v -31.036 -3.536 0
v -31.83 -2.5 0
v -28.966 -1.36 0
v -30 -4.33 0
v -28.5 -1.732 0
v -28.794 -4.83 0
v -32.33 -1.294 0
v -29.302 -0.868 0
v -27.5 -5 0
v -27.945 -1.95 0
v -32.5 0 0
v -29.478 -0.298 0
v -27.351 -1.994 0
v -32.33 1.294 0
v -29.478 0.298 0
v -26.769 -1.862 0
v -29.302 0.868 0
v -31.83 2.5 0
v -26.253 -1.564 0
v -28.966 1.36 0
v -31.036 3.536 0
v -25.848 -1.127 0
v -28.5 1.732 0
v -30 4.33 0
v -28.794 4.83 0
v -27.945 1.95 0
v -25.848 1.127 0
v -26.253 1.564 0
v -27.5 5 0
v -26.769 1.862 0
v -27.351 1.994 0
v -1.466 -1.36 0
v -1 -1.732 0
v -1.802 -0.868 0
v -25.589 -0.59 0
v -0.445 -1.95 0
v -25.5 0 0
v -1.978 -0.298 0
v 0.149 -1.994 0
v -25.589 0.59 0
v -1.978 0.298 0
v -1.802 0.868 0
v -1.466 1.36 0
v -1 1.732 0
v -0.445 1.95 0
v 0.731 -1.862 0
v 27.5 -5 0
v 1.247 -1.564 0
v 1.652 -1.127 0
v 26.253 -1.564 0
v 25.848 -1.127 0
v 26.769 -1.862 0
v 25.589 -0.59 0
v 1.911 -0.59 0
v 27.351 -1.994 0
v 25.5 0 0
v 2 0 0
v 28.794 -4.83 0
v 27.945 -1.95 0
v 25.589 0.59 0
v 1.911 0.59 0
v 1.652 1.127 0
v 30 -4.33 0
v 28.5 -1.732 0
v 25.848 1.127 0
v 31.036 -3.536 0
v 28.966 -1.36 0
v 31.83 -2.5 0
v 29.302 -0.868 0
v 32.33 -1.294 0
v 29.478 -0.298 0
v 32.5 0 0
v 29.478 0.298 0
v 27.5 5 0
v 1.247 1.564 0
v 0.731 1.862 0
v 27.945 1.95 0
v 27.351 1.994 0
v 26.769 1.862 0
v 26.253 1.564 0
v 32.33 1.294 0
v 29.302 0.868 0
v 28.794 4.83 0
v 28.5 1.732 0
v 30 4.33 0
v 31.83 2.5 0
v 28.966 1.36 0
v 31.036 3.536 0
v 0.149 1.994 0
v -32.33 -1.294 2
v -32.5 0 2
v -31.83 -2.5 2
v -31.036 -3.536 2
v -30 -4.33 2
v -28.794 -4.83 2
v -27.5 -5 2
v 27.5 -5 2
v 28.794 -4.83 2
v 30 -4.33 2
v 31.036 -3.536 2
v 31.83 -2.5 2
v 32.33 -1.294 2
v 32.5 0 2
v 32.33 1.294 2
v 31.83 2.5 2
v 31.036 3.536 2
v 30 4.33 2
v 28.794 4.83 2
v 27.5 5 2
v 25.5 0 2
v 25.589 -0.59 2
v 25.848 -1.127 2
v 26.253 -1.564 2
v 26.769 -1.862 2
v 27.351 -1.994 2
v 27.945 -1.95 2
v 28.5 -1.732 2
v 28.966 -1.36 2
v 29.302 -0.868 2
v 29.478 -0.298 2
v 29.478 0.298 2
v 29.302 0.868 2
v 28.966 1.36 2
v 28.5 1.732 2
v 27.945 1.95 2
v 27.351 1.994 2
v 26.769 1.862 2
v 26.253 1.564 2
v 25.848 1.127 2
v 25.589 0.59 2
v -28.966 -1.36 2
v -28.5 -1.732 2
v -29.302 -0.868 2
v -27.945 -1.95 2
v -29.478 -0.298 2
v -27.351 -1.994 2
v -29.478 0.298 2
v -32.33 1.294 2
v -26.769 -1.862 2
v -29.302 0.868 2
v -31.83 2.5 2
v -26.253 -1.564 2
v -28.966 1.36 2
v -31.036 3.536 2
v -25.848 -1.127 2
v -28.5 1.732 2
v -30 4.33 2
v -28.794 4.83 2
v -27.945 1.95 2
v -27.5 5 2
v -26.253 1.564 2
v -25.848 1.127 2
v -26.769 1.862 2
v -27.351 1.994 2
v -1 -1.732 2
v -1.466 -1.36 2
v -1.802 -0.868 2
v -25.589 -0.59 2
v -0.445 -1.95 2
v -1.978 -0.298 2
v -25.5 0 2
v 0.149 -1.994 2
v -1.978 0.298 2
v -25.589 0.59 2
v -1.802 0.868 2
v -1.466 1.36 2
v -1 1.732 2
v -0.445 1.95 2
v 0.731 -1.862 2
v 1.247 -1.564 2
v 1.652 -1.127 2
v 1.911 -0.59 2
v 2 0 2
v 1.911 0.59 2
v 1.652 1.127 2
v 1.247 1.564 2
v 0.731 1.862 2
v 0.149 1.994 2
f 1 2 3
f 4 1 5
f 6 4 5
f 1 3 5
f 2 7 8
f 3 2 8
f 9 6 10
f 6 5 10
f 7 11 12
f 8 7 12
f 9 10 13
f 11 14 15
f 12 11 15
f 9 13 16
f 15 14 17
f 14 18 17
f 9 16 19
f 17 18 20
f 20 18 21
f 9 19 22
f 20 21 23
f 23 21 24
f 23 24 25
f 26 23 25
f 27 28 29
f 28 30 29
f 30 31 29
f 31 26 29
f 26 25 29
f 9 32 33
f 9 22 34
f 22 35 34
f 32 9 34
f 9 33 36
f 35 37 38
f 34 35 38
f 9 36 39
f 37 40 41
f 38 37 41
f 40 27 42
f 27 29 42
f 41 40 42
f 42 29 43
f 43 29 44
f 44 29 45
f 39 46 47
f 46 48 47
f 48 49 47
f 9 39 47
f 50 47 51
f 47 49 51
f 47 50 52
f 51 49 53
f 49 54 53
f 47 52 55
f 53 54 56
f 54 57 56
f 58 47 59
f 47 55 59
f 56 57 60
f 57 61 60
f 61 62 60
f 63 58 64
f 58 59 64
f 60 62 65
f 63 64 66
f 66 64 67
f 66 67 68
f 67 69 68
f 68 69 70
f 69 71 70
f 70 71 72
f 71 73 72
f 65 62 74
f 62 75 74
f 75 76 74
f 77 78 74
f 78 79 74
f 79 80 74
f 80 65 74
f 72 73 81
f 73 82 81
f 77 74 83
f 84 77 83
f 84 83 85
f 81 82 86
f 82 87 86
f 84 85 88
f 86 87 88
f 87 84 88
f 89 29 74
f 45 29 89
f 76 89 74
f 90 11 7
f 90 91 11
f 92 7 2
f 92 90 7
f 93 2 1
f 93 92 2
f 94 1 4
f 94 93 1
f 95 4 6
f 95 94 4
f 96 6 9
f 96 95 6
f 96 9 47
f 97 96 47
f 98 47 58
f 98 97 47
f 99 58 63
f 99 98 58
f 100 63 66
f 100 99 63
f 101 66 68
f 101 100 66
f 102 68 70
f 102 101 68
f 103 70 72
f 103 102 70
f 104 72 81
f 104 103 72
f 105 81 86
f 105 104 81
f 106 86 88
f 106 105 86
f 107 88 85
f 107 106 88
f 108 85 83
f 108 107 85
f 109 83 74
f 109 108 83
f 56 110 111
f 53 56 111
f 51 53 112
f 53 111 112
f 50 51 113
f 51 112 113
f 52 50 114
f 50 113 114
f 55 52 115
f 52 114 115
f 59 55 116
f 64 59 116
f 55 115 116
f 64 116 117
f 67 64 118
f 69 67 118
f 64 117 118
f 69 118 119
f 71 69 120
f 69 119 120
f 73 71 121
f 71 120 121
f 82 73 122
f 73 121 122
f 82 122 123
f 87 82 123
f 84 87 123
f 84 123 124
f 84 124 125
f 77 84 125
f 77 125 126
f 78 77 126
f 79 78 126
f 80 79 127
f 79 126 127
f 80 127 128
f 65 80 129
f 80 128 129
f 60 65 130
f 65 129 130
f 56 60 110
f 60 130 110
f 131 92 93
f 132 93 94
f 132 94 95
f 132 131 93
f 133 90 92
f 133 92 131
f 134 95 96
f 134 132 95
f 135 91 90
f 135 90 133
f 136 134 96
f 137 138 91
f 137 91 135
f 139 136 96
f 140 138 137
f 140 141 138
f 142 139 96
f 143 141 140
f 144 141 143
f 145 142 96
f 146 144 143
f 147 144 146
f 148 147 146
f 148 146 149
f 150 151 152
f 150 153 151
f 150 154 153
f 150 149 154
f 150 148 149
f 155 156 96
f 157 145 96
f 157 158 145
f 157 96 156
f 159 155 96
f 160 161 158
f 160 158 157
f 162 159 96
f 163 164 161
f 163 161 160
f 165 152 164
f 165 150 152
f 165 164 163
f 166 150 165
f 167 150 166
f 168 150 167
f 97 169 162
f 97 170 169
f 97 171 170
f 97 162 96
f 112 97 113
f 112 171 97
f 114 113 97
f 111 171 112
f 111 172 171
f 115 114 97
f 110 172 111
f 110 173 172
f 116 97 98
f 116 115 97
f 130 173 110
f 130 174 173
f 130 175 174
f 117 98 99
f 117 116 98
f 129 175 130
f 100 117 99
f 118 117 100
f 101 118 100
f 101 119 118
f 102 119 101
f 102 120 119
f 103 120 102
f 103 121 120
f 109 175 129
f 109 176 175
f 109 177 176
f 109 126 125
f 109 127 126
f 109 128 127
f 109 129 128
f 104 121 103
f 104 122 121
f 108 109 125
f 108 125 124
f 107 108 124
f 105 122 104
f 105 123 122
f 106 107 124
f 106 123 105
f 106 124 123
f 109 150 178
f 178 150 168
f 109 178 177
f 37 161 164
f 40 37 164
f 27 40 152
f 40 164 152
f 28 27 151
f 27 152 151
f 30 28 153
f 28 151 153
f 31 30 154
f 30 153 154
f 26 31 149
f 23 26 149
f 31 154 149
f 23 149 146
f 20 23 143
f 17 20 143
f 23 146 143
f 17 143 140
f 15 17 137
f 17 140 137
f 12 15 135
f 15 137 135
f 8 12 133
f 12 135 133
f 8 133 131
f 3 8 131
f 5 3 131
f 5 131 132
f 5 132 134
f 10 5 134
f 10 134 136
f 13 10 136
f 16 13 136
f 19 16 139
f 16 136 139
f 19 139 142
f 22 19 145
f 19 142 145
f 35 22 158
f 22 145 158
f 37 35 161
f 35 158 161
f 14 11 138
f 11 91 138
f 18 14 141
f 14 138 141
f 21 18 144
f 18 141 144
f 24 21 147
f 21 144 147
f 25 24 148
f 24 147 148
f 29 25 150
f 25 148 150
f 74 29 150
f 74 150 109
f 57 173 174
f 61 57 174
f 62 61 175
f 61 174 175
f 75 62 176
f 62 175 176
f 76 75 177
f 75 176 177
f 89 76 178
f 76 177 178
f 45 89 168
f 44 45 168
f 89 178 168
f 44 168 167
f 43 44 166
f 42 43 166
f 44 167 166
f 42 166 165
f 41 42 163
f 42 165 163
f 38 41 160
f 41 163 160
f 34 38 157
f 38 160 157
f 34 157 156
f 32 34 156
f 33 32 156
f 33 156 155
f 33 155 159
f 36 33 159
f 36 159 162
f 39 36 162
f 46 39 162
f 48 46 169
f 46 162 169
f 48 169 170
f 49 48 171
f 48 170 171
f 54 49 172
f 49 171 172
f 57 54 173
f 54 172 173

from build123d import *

# Parameters (mm, degrees)
SKETCH_1_W          = 65
SKETCH_1_H          = 10
EXTRUDE_1_DEPTH     = 2
FILLET_1_R          = 5
SKETCH_3_R          = 2
CUT_EXTRUDE_1_DEPTH = 2


with BuildPart() as part:
    # 草图1 → 凸台-拉伸1 (new body)
    with BuildSketch(Plane.XY):
        Rectangle(SKETCH_1_W, SKETCH_1_H)
    extrude(amount=EXTRUDE_1_DEPTH)

    # 圆角1
    fillet_1_edges = [part.edges().sort_by_distance(p)[0] for p in [
        (32.5, -5, 1),
        (-32.5, -5, 1),
        (-32.5, 5, 1),
        (32.5, 5, 1),
    ]]
    fillet(fillet_1_edges, radius=FILLET_1_R - 0.0001)  # a hair under: the kernel refuses the full size

    # 草图3 → 切除-拉伸1 (cut)
    with BuildSketch(Plane.XY.offset(2)):
        with Locations((-27.5, 0)):
            Circle(SKETCH_3_R)
        with Locations(Location((27.5, 0, 0), (0, 0, 180))):
            Circle(SKETCH_3_R)
        Circle(SKETCH_3_R)
    extrude(amount=-CUT_EXTRUDE_1_DEPTH, mode=Mode.SUBTRACT)


solid = part.part
